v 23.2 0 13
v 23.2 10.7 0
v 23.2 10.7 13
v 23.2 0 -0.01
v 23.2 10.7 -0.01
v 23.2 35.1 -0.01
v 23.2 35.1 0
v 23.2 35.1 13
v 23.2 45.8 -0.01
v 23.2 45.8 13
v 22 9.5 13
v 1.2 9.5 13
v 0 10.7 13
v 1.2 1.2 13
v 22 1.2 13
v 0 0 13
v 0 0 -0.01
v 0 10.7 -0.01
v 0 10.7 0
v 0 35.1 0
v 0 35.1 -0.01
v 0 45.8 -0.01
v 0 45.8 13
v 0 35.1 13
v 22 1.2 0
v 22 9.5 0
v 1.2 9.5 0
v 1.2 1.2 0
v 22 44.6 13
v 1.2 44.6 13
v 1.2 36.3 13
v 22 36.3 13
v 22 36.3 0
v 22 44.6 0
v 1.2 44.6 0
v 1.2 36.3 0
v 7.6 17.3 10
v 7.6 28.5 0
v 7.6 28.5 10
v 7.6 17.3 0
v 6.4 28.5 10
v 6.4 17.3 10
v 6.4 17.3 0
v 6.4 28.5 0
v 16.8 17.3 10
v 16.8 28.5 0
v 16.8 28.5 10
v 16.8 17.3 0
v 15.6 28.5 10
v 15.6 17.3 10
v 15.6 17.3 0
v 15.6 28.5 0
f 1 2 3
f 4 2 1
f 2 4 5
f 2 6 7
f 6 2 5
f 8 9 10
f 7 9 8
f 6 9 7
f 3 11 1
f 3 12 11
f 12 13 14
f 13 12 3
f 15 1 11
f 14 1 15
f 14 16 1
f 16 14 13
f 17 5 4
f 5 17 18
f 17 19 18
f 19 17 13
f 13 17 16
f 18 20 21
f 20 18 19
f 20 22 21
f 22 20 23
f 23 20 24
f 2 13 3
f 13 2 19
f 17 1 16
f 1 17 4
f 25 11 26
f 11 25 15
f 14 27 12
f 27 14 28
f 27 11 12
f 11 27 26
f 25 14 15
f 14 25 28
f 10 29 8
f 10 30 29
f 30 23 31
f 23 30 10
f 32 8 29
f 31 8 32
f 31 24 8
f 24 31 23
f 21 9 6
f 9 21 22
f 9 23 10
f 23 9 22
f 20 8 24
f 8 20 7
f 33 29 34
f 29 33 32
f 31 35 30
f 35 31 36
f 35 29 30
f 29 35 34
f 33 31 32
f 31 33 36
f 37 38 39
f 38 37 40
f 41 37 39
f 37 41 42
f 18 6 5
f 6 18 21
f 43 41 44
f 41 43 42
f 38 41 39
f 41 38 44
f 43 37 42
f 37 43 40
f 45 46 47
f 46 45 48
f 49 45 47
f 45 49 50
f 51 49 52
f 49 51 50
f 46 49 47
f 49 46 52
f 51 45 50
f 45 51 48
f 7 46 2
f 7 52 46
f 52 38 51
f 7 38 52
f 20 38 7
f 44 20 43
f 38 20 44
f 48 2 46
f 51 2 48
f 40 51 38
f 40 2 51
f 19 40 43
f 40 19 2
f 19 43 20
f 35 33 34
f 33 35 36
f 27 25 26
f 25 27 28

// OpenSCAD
// file: ../Base/Rotation.scad
// Fischertechnik Box Foundation
// Geometry Helpers Rotation

include <PlacementOptions.scad>

// getRotatedSpace(space, rotation=NoRotation)
// Rotates the space dependent on the specified rotation

function getRotatedSpace(space, rotation=NoRotation) = [
    (rotation == Rotate90 || rotation == Rotate270) ? space.y : space.x,
    (rotation == Rotate90 || rotation == Rotate270) ? space.x : space.y
];

// Rotates the given space around the fixed left lower corner
// space = the space the children needs as width/depth list [width,depth]
// rotation = 0 Rotate0 degrees, 1 Rotate90 degrees, 2 Rotate180 degrees, 3 Rotate270 degrees (equivalent to -90)

module RotateFix(space, rotation=NoRotation) {
    dy = (rotation == Rotate0 || rotation == Rotate270) ? 0 :
        (rotation == Rotate90) ? space.x :
        space.y;
    dx = (rotation < Rotate180) ? 0 :
        (rotation == Rotate180) ? space.x :
        space.y;
    
    translate([dx, dy, 0])
        rotate([0, 0, rotations[rotation]])
            children();
}
// file: ../Base/Alignment.scad
// Fischertechnik Box Foundation
// Geometry Helpers Alignment

include <PlacementOptions.scad>

// getAlignedX(elementWidth, spaceWidth, align=AlignRight, offset=0)
// Gets the aligned X offset of an element with the given
// width in the given space.
// elementWidth = The width of the element to positon
// spaceWidth = The space where the element should be aligned
// align = 0 AlignLeft, 1 AlignCenter, 2 AlignRight
// offset = an optional offset from the aligned position. When
// aligned left or centered, then positive values are in X direction.
// When aligned right then positive values are in negative X direction.

function getAlignedX(elementWidth, spaceWidth, align=AlignRight, offset=0) =
    (align == AlignLeft) ?
        offset :
        ((align == AlignCenter) ?
        (spaceWidth - elementWidth)/2 + offset :
        spaceWidth - offset - elementWidth);

// getAlignedY(elementDepth, spaceDepth, align=AlignTop, offset=0)
// Gets the aligned Y offset of an element with the given
// depth in the given space.
// elementDepth = The depth of the element to positon
// spaceDepth = The space where the element should be aligned
// align = 0 AlignBottom, 1 AlignCenter, 2 AlignTop
// offset = an optional offset from the aligned position. When
// aligned bottom or centered, then positive values are in Y direction.
// When aligned top then positive values are in negative Y direction.

function getAlignedY(elementDepth, spaceDepth, align=AlignTop, offset=0) =
    (align == AlignBottom) ?
        offset :
        ((align == AlignCenter) ?
        (spaceDepth - elementDepth)/2 + offset :
        spaceDepth - offset - elementDepth);
// file: ../Base/PlacementOptions.scad
// Fischertechnik Box Foundation
// Placement Options

// Alignment
NoAlign = 0;
AlignLeft = 1;
AlignBottom = 2;
AlignCenter = 3;
AlignRight = 4;
AlignTop = 5;

// Element rotation degree steps
rotations = [0, -90, -180, -270];

// Rotation
NoRotation = 0;
Rotate0 = 0;
Rotate90 = 1;
Rotate180 = 2;
Rotate270 = 3;

// Docking (seen from above)
NoDock = -1;
DockLeft = 0;
DockTop = 1;
DockRight = 2;
DockCorner = 2;
DockBottom = 3;

// Web corners
LowerLeft = 0;
UpperLeft = 1;
UpperRight = 2;
LowerRight = 3;

// Web position relative to corner
LeftOfCorner = 0;
RightOfCorner = 1;
// file: ../Base/Boxes.scad
// Fischertechnik Box Foundation
// Pre-designed Boxes

use <Constants.scad>

include <PlacementOptions.scad>

box190Width = 190;
box190Depth = 130;
box130Width = 130;
box130Depth = 95;

// Values are from an original ec3 box
topBottomDifference = 1.5;
outerHeight = 40;
innerHeight = 38.2;
baseThickness = outerHeight - innerHeight;
stackExcess = 5.7;
radius = 3.5;
wallThickness = 1.5;
tolerance = 0.2;
stackOffset = innerHeight - stackExcess;

boxUsageHeight = stackOffset;
boxWallThickness = wallThickness;
boxBaseThickness = baseThickness;
boxWebWidth = 3.0;

// getBoxWallThickness()
// Gets the wall thickness of a Fischertechnik Box
function getBoxWallThickness() = boxWallThickness;

// getBoxUsageHeight()
// Gets the usable height of a Fischertechnik box
function getBoxUsageHeight() = boxUsageHeight;

// getBoxInnerHeight()
// Gets the inner height of a Fischertechnik box, including the stack excess
function getBoxInnerHeight() = innerHeight;

// getBoxBaseThickness()
// Gets the thickness of the Fischertechnik box base.
function getBoxBaseThickness() = boxBaseThickness;

// getBoxWebWidth()
// Gets the width of a box web
function getBoxWebWidth() = boxWebWidth;

// getBox190Space()
// Gets the usable inner space of a Box 190 as an x/y-list
function getBox190Space() = [
    box190Width - 2*getBoxWallThickness() - topBottomDifference, 
    box190Depth - 2*getBoxWallThickness() - topBottomDifference ];

// BoxBase(width, depth)
// Creates an empty stackable Fischertechnik compatible box
// width = Outer width of the box (190, 130, ...)
// depth = Outer depth of the box (130, 95, ...)

module BoxBase(width, depth, height=outerHeight) {    
    thinPlate = 0.01;

    innerHeight = height - baseThickness;    
    
    module BodyPlate(width, depth) {
        translate([radius, radius])
        hull() {
            w = width-2*radius;
            d = depth-2*radius;
            cube([w, d, thinPlate]);
            cylinder(thinPlate, r=radius, $fn=getFragments());
            translate([w, 0])
                cylinder(thinPlate, r=radius, $fn=getFragments());
            translate([w, d])
                cylinder(thinPlate, r=radius, $fn=getFragments());
            translate([0, d])
                cylinder(thinPlate, r=radius, $fn=getFragments());
        }
    }
    
    module Body(tolerance=tolerance) {
        hull() {
            // Bottom with tolerance to fit into the original boxes when stacked
            translate([-wallThickness+tolerance, -wallThickness+tolerance, -baseThickness])
                BodyPlate(width-topBottomDifference-2*tolerance, depth-topBottomDifference-2*tolerance);
            
            // Top
            translate([-wallThickness-topBottomDifference/2, -wallThickness-topBottomDifference/2, innerHeight-thinPlate])
                BodyPlate(width, depth);
         }
    }

    module Cutoff() {
        hull() {
            coWidth = width - 2*wallThickness;
            coDepth = depth - 2*wallThickness;
            
            // Bottom
            BodyPlate(coWidth-topBottomDifference, coDepth-topBottomDifference);

            // Top
            translate([-topBottomDifference/2, -topBottomDifference/2, innerHeight+thinPlate]) 
                BodyPlate(coWidth, coDepth);
        }
    }
    
    difference() {        
        Body();
        Cutoff();
        stackOffset = innerHeight - stackExcess;
        translate([0, 0, stackOffset + baseThickness])
            Body(tolerance=0);
    }
}

// Creates the Fischertechnik empty box 130x190 mm and places it at position 0,0
// 190x130 are the outer sizes, the inner space is slightly smaller. Use getBox190Space() to get the inner sizes.
// The box is positioned that the usable inner space is at the 0,0,0 position. The

module Box190() {
    BoxBase(box190Width, box190Depth);
}

// Gets the usable inner space of a Box 130 as an x/y-list
function getBox130Space() = [
    box130Width - 2*getBoxWallThickness(), 
    box130Depth - 2*getBoxWallThickness() ];

// Creates the Fischertechnik empty box 95x130 mm and places it at position 0,0
// 190x130 are the outer sizes, the inner space is slightly smaller. Use getBox190Space() to get the inner sizes.
// The box is positioned that the usable inner space is at the 0,0,0 position. The

module Box130() {
    BoxBase(box130Width, box130Depth);
}

// Creates a web at the specified box walls
// corner 0 = LowerLeft, 1 = UpperLeft, 2 = UpperRight, 3 = LowerRight
// side 0 = LeftOfCorner, 1 = RightOfCorner
// distance = Distance in mm from the corner
// boxSpace = inner width and depth of the box (default: Box 190)
// webWidth = length of the web (default is 3 mms)
// webThickness = thickness of the web (default is 1 mm)

module BoxWeb(corner, side, distance, boxSpace=getBox190Space(), webWidth=getBoxWebWidth(), webThickness=1.0) {
    sink = getBoxWallThickness()/2;

    width = (corner % 2 == 0) ? 
            (side == LeftOfCorner ? webWidth : webThickness) :
            (side == LeftOfCorner ? webThickness : webWidth);

    depth = (corner % 2 == 0) ? 
            (side == RightOfCorner ? webWidth : webThickness) :
            (side == RightOfCorner ? webThickness : webWidth);
    
    xDiff = corner == LowerLeft ? 
                (side == LeftOfCorner ? -sink : distance) :
            (corner == UpperLeft ?                
                (side == LeftOfCorner ? distance : -sink) :
            (corner == UpperRight ?
                (side == LeftOfCorner ? boxSpace.x-webWidth+sink : boxSpace.x-distance-webThickness) :
                (side == LeftOfCorner ? boxSpace.x-distance-webThickness: boxSpace.x-webWidth+sink)));

    yDiff = corner == LowerLeft ? 
                (side == RightOfCorner ? -sink : distance) :
            (corner == UpperLeft ?
                (side == RightOfCorner ? boxSpace.y-distance : boxSpace.y-webWidth+sink) :
            (corner == UpperRight ?
                (side == RightOfCorner ? boxSpace.y-webWidth+sink : boxSpace.y-distance) :
                (side == RightOfCorner ? distance : -sink)));
    
    translate([xDiff, yDiff, -getExcess()])
        cube([width, depth, boxUsageHeight + 2*getExcess()]);
}
// file: ../Base/Placement.scad
// Fischertechnik Box Foundation
// Geometry Helpers Placement

use <Constants.scad>
use <Alignment.scad>
use <Rotation.scad>
use <Boxes.scad>

include <PlacementOptions.scad>

// Place(x=0, y=0, elementSpace=[0,0], alignX=AlignLeft, alignY=AlignBottom, rotation=Rotate0, boxSpace=getBox190Space())
// Places the child at the specified position
// y = Y-Position. This is a relative position when an X aligment is specified.
// x = X-Position. This is a relative position when an Y aligment is specified.
// elementSpace = space of the element to be placed [x,y]
// alignX = -1=NoAlign, 0 AlignLeft, 1 AlignCenter, 3 AlignRight (elementSpace and boxSpace required!)
// alignY = -1=NoAlign, 2 AlignBottom, 1 AlignCenter, 4 AlignTop (elementSpace and boxSpace required!)
// rotation = 0 Rotate0 0 degrees, 1 Rotate90 90 degrees, 
// 2 Rotate180 180 degrees, 3 Rotate270 270 degrees (equivalent to -90)
// boxSpace = Inner space of the box where the placement occurs [x,y] - default is Box 190x130 inner space

module Place(x=0, y=0, elementSpace=[0,0], 
  alignX=AlignLeft, alignY=AlignBottom, 
  rotation=NoRotation, boxSpace=getBox190Space()) {

    module Position(x, y, space, rotation=Rotate0) {
        translate([x, y, 0])
            RotateFix(space, rotation)
                children();
    }

    space = getRotatedSpace(elementSpace, rotation);
    alignedX = getAlignedX(space.x, boxSpace.x, alignX, x);
    alignedY = getAlignedY(space.y, boxSpace.y, alignY, y);
    Position(alignedX, alignedY, elementSpace, rotation)
        children();
}

// Center(space=getBox130Space(), elementSpace=[0,0])
// space = Space where the children is centered. For cylinder use centered=true and no elementSpace.
// elementSpace = space of the element to be centered [x,y]

module Center(space=getBox190Space(), elementSpace=[0,0]) {
    Place(elementSpace=elementSpace, boxSpace=space, alignX=AlignCenter, alignY=AlignCenter)
        children();
}

// CenterHorizontal(width=0, y=0, offset=0, space=getBox130Space())
// width = Width of the element to be placed.
// y = Y position of the element
// offset = Offset from the center position (negative will be left of the center)
// space = Space where the element is placed

module CenterHorizontal(width=0, y=0, offset=0, space=getBox190Space()) {
    Place(x=offset, y=y, elementSpace=[width, 0], boxSpace=space, alignX=AlignCenter)
        children(0);
}

// CenterVertical(depth=0, x=0, offset=0, space=getBox130Space())
// depth = Depth of the element to be placed.
// x = X position of the element
// offset = Offset from the center position (negative will be down of the center)
// space = Space where the element is placed

module CenterVertical(depth=0, x=0, offset=0, space=getBox190Space()) {
    Place(x=x, y=offset, elementSpace=[0, depth], boxSpace=space, alignY=AlignCenter)
        children(0);
}

// getIsVertical(align)
// True if the specified alignment needs a vertical orientation for a divider (AlignRight, AlignLeft)

function getIsVertical(align) = (align == AlignRight || align == AlignLeft);

// getIsHorizontal(align)
// True if the specified alignment needs a horizontal orientation for a divider (AlignTop, AlignBottom)

function getIsHorizontal(align) = (align == AlignTop || align == AlignBottom);
// file: ../Base/Constants.scad
// Fischertechnik Box Foundation
// Constants

// Constant values necessary for multiple elements

// Base constants
dividerThickness = 1.2;
excess = 0.01;
fragments = 90;
tolerance = 0.8;

// Gets the thickness of a divider 
function getDividerThickness() = dividerThickness;

// Gets the excess that is used to merge walls into each other
function getExcess() = excess;

// Gets amount of fragments of a cylinder
function getFragments() = fragments;

// Gets the inner tolerance of a frame to each side
function getTolerance() = tolerance;


// Fischertechnik specific constants
axisDiameter = 4;
axisBottomDiameter = axisDiameter + 1;
standardEdgeDistance = 2.5;
standardWebDistance = 11.5;
standardCornerLength = 15;
tubeWallFactor = 0.8;
smallPartsFrameHeight = 20;

// Gets axis diameter
function getAxisDiameter() = axisDiameter;

// Gets axis bottom diameter for thicker part at the bottom
function getAxisBottomDiameter() = axisBottomDiameter;

// gets the standard distance to the wall of the box for dockable frames with webs
function getStandardEdgeDistance() = standardEdgeDistance;

// gets the standard distance of each web to the corner of the dockable frame
function getStandardWebDistance() = standardWebDistance;

// gets the standard length of the corner walls of a dockable frame
function getStandardCornerLength() = standardCornerLength;

// gets the wall thickness of a tube.
function getTubeWallThickness() = tubeWallFactor * getDividerThickness();

// gets the frame height for docked small parts boxes.
function getSmallPartsFrameHeight() = smallPartsFrameHeight;
// file: FrameLockingRing.scad
// Fischertechnik Box Library
// Frame for Locking Ring
// 31020

use <../Base/Constants.scad>
use <../ModelBase/Simple.scad>

width = 20;
depth = 7.5;
height = 13;

// getFrameLockingRingSpace(columns=1, rows=1)
// columns = Count of locking rings in X direction (width of ring)
// rows = Count of locking rings in Y direction (depth of ring)
// Gets the space the frame locking ring needs as width (.x and .y as a list)

function getFrameLockingRingSpace(columns=1, rows=1) = getFrameOuterVolume([width*columns, depth*rows, height]);

// FrameLockingRing(columns, rows, smallSideIsX)
// columns = Count of locking rings in X direction (width of ring)
// rows = Count of locking rings in Y direction (depth of ring)
// The walls of the frame are 13 mm high. The small side is 7.5 mm wide, the large side
// is 20 mm wide.

module FrameLockingRing(columns=1, rows=1) {
    Frame([width*columns, depth*rows, height]);
}

// Tests
color("lightgray")
    FrameLockingRing(1);
// file: HolderWinchDrum.scad
// Fischertechnik Box Library
// Holder for Winch Drum
// 31016

use <../Base/Constants.scad>
use <../Base/Placement.scad>
use <../ModelBase/Simple.scad>

width = 20;
depth = 25;
height = 10;

// getWinchDrumHolderSpace()
// Gets the space the winch drum holder needs as width and depth (.x and .y as a list)

function getHolderWinchDrumSpace() = [width, depth, height];

// HolderWinchDrum()
// Two walls for holding the 31016 winch drum.

module HolderWinchDrum() {
    holderDepth = 11.2;
    holderDistance = 8;
    
    Space(getHolderWinchDrumSpace());
    
    module Holders() {
        Wall([getDividerThickness(), holderDepth, height]);
        translate([holderDistance + getDividerThickness(), 0])
            Wall([getDividerThickness(), holderDepth, height]);
    }
    
    Center(getHolderWinchDrumSpace(), [holderDistance + 2*getDividerThickness(), holderDepth]) {
        Holders();
    }
}

// Tests
color("lightgray")
HolderWinchDrum();
// main file
// Fischertechnik Box Library
// Combo Winch Drum with Locking Rings
// 31016 + 2 x 31020

use <../ModelBase/Simple.scad>
use <HolderWinchDrum.scad>
use <FrameLockingRing.scad>

distance = 24.4;

// getComboHolderWinchDrumWithLockingRingsSpace()
// Gets the space the holder winch drum with locking rings needs as width (.x and .y as a list)

function getComboHolderWinchDrumWithLockingRingsSpace() = [
    getFrameLockingRingSpace().x, 
    getFrameLockingRingSpace().y * 2 + distance,
    getFrameLockingRingSpace().z];

// ComboHolderWinchDrumWithLockingRings
// Combination of a winch drum holder with two locking ring holders at both ends

module ComboHolderWinchDrumWithLockingRings() {    
    yOffsetFrame = distance + getFrameLockingRingSpace()[1];
    
    Space(getComboHolderWinchDrumWithLockingRingsSpace());
    
    FrameLockingRing();
    translate([0, yOffsetFrame, 0])
        FrameLockingRing();
    
    xOffset = (getFrameLockingRingSpace()[0] - getHolderWinchDrumSpace()[0]) / 2;
    yOffset = (distance + 2 * getFrameLockingRingSpace()[1] - getHolderWinchDrumSpace()[1]) / 2;
    
    translate([xOffset, yOffset, 0])
        HolderWinchDrum();
}

// Tests
color("lightgray")
ComboHolderWinchDrumWithLockingRings();
